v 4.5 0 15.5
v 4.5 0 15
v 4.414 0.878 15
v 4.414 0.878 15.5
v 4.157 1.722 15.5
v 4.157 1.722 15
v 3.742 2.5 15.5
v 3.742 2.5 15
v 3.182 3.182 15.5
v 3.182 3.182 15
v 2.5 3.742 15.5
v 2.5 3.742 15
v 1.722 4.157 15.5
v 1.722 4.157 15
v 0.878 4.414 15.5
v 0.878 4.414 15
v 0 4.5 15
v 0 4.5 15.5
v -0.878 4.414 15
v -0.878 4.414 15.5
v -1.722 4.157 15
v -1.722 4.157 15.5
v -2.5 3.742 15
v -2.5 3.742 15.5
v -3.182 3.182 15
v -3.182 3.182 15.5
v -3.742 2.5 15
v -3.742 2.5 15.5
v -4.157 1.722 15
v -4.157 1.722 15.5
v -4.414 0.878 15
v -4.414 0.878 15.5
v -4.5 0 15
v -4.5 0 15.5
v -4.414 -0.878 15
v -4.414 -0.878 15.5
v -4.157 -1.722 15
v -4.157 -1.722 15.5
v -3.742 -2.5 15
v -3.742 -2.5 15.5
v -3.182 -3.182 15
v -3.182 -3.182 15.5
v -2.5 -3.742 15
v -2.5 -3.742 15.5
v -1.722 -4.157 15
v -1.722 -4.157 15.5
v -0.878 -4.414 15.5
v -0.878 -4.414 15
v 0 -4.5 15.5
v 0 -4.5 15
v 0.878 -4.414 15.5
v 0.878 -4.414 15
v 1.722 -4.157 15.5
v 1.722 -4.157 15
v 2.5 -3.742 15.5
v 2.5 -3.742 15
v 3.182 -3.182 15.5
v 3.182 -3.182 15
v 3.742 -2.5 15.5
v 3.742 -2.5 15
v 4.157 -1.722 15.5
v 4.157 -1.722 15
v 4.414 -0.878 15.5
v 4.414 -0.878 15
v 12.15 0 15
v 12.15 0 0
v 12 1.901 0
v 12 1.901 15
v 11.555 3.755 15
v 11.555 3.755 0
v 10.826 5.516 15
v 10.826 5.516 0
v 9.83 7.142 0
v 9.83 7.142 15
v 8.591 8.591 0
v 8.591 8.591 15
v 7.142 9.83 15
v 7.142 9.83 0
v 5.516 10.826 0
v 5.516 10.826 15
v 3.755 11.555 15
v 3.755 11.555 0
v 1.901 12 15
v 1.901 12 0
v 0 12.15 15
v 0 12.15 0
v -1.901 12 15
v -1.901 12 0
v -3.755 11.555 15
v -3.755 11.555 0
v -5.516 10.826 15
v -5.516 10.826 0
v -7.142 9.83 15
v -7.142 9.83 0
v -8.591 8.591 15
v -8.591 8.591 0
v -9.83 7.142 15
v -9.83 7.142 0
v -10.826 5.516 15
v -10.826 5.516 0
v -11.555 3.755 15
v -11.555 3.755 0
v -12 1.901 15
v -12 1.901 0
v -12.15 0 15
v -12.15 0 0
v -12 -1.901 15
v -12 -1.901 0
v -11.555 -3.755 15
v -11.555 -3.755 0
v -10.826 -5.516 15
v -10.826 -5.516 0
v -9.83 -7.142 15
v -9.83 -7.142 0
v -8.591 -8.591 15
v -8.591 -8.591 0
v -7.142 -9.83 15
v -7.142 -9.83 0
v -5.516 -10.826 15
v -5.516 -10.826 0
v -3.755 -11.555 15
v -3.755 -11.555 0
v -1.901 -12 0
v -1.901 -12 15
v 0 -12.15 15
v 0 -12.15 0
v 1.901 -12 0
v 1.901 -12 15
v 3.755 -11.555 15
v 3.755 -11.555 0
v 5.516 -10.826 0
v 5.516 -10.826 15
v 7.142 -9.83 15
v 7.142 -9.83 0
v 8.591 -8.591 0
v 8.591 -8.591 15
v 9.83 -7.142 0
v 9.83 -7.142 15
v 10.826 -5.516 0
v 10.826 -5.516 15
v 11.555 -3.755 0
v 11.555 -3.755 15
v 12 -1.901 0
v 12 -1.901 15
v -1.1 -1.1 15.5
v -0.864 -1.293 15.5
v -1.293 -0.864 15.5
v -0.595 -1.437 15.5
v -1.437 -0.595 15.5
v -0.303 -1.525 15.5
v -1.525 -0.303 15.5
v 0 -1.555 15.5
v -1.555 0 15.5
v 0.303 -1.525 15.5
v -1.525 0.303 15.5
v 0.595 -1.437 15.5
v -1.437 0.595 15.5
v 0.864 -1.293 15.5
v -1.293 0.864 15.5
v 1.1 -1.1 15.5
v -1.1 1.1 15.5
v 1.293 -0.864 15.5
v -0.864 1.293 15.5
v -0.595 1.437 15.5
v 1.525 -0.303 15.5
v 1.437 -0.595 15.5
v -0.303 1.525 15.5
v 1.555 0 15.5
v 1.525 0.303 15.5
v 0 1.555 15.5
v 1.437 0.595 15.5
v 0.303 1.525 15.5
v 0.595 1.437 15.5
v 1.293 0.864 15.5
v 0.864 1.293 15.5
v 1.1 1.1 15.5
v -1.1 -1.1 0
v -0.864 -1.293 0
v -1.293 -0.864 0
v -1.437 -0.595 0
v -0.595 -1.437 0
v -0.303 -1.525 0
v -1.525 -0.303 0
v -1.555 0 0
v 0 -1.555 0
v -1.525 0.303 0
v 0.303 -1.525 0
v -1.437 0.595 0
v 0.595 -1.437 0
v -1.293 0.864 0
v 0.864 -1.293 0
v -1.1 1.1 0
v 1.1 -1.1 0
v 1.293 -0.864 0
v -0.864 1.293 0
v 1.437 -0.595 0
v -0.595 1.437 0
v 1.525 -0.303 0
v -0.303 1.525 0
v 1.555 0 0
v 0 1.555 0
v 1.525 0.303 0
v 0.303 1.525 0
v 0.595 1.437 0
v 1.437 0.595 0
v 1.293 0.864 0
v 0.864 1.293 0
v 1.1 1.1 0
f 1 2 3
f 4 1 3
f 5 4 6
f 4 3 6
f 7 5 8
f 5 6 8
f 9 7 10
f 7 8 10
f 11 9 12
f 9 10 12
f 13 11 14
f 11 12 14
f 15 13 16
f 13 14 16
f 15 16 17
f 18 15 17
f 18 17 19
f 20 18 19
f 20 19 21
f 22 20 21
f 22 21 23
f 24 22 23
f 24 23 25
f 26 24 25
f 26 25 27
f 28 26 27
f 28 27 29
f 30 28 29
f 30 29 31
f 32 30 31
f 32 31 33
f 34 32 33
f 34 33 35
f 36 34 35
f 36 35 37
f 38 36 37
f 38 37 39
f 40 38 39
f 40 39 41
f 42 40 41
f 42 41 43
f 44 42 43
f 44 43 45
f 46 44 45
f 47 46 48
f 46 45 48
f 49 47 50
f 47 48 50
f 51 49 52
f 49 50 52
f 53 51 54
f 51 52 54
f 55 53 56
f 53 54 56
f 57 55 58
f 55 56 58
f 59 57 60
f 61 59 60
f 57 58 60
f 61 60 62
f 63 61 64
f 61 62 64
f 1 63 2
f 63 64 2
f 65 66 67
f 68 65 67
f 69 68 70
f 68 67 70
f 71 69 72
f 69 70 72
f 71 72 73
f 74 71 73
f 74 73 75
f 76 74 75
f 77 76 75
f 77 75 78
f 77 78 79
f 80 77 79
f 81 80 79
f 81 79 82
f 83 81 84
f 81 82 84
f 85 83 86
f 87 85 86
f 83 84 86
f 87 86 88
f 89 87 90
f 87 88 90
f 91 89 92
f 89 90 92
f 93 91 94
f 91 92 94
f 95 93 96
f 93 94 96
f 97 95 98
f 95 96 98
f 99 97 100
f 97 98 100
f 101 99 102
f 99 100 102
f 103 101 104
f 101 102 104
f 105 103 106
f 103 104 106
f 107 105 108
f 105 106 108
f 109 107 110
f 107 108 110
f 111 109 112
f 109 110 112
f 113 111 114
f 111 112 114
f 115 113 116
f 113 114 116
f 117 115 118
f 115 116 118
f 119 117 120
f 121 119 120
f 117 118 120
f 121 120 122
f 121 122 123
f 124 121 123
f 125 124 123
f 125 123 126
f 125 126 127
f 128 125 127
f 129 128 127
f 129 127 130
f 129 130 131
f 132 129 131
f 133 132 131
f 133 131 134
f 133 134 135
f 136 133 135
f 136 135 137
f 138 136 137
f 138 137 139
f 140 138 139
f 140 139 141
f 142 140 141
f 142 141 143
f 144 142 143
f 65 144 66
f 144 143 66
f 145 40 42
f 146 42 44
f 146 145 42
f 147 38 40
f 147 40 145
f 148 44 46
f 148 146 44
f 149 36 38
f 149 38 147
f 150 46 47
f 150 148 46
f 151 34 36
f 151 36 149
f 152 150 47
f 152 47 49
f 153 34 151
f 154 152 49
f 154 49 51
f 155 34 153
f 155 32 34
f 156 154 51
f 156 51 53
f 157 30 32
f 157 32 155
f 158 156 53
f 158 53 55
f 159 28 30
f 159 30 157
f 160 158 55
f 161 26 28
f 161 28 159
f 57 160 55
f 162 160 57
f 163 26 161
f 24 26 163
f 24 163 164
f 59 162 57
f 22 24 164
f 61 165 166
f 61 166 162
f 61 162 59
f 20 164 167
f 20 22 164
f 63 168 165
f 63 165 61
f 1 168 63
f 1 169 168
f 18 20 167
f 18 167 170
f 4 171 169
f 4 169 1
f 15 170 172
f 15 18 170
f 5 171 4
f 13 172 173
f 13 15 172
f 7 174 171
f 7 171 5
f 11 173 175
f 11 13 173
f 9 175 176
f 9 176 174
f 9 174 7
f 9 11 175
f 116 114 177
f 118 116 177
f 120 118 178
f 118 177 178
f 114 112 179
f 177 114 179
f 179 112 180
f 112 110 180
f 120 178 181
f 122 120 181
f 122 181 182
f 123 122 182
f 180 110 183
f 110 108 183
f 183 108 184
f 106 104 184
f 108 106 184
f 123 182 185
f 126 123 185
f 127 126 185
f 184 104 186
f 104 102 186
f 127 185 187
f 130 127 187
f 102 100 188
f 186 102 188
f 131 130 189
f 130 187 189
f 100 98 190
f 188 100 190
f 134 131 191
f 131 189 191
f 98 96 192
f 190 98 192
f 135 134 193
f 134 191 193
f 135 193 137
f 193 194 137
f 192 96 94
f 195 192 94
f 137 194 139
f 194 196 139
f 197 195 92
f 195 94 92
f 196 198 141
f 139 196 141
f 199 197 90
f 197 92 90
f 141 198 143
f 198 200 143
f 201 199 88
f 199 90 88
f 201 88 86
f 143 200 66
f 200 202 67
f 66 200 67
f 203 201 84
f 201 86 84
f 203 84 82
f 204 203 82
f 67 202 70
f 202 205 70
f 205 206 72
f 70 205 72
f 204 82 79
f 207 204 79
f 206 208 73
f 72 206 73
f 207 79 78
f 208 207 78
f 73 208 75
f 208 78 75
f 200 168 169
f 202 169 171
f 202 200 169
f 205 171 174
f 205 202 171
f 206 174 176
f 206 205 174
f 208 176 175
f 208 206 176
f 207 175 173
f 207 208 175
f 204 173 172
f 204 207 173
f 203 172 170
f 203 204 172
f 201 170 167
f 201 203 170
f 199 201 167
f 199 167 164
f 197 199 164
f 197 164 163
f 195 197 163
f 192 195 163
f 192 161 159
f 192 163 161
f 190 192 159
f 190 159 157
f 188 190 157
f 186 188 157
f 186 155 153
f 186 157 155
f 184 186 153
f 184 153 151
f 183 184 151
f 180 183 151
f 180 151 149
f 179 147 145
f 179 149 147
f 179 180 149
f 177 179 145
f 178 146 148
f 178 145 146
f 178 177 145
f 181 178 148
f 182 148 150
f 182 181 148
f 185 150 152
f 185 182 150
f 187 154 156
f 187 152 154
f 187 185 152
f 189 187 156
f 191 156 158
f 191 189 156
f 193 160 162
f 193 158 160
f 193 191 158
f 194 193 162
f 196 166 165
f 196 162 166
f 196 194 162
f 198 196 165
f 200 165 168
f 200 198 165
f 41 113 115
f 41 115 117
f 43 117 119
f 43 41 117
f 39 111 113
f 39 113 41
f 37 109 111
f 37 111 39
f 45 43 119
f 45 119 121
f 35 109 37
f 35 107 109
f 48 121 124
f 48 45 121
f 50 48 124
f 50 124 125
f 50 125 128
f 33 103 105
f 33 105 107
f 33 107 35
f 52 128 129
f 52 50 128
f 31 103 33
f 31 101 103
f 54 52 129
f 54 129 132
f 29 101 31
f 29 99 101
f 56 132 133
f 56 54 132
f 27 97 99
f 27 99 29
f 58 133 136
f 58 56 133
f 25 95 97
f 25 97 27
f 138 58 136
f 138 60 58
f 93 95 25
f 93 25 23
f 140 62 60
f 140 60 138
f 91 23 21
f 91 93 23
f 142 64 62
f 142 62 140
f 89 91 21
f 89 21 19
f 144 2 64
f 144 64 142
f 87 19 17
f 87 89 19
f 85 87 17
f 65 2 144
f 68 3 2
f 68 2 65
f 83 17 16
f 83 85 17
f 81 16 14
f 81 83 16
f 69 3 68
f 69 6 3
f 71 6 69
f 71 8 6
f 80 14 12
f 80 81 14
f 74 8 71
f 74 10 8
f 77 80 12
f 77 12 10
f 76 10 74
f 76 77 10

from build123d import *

# Parameters (mm, degrees)
ESBO_O1_R                  = 12.15
RESSALTO_EXTRUS_O1_DEPTH   = 15
ESBO_O2_R                  = 4.5
RESSALTO_EXTRUS_O2_DEPTH   = 15.5
ESBO_O3_R                  = 1.554984666
CORTE_EXTRUS_O1_DEPTH      = 19.5
CORTE_EXTRUS_O1_DEPTH_BACK = 15.5


with BuildPart() as part:
    # Esboço1 → Ressalto-extrusão1 (new body)
    with BuildSketch(Plane.XY):
        Circle(ESBO_O1_R)
    extrude(amount=RESSALTO_EXTRUS_O1_DEPTH)

    # Esboço2 → Ressalto-extrusão2 (add)
    with BuildSketch(Plane.XY):
        Circle(ESBO_O2_R)
    extrude(amount=RESSALTO_EXTRUS_O2_DEPTH)

    # Esboço3 → Corte-extrusão1 (cut, two sides)
    with BuildSketch(Plane.XY) as corte_extrus_o1_sk:
        Circle(ESBO_O3_R)
    extrude(amount=CORTE_EXTRUS_O1_DEPTH, mode=Mode.SUBTRACT)
    extrude(corte_extrus_o1_sk.sketch, amount=-CORTE_EXTRUS_O1_DEPTH_BACK, mode=Mode.SUBTRACT)


solid = part.part
